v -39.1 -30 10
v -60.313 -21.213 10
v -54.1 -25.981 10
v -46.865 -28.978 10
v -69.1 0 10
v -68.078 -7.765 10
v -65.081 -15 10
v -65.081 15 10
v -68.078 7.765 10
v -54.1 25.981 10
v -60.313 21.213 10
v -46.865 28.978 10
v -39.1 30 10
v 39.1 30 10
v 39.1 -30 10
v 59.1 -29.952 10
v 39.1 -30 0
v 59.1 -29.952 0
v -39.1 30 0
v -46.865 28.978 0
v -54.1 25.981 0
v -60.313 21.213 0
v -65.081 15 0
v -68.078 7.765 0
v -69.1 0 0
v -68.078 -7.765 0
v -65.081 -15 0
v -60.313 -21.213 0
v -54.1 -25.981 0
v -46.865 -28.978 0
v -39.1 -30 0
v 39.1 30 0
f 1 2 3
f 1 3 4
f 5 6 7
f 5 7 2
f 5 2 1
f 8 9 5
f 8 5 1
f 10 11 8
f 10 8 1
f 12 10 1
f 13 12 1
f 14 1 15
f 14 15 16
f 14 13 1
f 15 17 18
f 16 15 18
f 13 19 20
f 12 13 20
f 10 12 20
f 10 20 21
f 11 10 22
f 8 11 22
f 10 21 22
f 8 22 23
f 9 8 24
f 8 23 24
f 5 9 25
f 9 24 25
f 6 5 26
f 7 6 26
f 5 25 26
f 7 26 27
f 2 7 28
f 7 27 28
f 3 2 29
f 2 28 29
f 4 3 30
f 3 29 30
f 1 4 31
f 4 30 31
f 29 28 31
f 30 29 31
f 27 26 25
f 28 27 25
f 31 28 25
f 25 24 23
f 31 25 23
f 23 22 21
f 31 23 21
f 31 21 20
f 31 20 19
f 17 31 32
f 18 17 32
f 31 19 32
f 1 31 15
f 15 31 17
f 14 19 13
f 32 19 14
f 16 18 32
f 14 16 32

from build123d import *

# Parameters (mm, degrees)
F0_W     = 78.2
F0_H     = 60
F1_DEPTH = 10


with BuildPart() as f1:
    # F0 (on Top) → F1 (new body)
    with BuildSketch(Plane.XY):
        Polygon((59.099942, -29.952), (39.1, 30), (39.1, -30), align=None)
        Rectangle(F0_W, F0_H)
        with BuildLine():
            Line((-39.1, -30), (-39.1, 30))
            ThreePointArc((-39.1, 30), (-69.1, 0), (-39.1, -30))
        make_face()
    extrude(amount=F1_DEPTH)


solid = f1.part
